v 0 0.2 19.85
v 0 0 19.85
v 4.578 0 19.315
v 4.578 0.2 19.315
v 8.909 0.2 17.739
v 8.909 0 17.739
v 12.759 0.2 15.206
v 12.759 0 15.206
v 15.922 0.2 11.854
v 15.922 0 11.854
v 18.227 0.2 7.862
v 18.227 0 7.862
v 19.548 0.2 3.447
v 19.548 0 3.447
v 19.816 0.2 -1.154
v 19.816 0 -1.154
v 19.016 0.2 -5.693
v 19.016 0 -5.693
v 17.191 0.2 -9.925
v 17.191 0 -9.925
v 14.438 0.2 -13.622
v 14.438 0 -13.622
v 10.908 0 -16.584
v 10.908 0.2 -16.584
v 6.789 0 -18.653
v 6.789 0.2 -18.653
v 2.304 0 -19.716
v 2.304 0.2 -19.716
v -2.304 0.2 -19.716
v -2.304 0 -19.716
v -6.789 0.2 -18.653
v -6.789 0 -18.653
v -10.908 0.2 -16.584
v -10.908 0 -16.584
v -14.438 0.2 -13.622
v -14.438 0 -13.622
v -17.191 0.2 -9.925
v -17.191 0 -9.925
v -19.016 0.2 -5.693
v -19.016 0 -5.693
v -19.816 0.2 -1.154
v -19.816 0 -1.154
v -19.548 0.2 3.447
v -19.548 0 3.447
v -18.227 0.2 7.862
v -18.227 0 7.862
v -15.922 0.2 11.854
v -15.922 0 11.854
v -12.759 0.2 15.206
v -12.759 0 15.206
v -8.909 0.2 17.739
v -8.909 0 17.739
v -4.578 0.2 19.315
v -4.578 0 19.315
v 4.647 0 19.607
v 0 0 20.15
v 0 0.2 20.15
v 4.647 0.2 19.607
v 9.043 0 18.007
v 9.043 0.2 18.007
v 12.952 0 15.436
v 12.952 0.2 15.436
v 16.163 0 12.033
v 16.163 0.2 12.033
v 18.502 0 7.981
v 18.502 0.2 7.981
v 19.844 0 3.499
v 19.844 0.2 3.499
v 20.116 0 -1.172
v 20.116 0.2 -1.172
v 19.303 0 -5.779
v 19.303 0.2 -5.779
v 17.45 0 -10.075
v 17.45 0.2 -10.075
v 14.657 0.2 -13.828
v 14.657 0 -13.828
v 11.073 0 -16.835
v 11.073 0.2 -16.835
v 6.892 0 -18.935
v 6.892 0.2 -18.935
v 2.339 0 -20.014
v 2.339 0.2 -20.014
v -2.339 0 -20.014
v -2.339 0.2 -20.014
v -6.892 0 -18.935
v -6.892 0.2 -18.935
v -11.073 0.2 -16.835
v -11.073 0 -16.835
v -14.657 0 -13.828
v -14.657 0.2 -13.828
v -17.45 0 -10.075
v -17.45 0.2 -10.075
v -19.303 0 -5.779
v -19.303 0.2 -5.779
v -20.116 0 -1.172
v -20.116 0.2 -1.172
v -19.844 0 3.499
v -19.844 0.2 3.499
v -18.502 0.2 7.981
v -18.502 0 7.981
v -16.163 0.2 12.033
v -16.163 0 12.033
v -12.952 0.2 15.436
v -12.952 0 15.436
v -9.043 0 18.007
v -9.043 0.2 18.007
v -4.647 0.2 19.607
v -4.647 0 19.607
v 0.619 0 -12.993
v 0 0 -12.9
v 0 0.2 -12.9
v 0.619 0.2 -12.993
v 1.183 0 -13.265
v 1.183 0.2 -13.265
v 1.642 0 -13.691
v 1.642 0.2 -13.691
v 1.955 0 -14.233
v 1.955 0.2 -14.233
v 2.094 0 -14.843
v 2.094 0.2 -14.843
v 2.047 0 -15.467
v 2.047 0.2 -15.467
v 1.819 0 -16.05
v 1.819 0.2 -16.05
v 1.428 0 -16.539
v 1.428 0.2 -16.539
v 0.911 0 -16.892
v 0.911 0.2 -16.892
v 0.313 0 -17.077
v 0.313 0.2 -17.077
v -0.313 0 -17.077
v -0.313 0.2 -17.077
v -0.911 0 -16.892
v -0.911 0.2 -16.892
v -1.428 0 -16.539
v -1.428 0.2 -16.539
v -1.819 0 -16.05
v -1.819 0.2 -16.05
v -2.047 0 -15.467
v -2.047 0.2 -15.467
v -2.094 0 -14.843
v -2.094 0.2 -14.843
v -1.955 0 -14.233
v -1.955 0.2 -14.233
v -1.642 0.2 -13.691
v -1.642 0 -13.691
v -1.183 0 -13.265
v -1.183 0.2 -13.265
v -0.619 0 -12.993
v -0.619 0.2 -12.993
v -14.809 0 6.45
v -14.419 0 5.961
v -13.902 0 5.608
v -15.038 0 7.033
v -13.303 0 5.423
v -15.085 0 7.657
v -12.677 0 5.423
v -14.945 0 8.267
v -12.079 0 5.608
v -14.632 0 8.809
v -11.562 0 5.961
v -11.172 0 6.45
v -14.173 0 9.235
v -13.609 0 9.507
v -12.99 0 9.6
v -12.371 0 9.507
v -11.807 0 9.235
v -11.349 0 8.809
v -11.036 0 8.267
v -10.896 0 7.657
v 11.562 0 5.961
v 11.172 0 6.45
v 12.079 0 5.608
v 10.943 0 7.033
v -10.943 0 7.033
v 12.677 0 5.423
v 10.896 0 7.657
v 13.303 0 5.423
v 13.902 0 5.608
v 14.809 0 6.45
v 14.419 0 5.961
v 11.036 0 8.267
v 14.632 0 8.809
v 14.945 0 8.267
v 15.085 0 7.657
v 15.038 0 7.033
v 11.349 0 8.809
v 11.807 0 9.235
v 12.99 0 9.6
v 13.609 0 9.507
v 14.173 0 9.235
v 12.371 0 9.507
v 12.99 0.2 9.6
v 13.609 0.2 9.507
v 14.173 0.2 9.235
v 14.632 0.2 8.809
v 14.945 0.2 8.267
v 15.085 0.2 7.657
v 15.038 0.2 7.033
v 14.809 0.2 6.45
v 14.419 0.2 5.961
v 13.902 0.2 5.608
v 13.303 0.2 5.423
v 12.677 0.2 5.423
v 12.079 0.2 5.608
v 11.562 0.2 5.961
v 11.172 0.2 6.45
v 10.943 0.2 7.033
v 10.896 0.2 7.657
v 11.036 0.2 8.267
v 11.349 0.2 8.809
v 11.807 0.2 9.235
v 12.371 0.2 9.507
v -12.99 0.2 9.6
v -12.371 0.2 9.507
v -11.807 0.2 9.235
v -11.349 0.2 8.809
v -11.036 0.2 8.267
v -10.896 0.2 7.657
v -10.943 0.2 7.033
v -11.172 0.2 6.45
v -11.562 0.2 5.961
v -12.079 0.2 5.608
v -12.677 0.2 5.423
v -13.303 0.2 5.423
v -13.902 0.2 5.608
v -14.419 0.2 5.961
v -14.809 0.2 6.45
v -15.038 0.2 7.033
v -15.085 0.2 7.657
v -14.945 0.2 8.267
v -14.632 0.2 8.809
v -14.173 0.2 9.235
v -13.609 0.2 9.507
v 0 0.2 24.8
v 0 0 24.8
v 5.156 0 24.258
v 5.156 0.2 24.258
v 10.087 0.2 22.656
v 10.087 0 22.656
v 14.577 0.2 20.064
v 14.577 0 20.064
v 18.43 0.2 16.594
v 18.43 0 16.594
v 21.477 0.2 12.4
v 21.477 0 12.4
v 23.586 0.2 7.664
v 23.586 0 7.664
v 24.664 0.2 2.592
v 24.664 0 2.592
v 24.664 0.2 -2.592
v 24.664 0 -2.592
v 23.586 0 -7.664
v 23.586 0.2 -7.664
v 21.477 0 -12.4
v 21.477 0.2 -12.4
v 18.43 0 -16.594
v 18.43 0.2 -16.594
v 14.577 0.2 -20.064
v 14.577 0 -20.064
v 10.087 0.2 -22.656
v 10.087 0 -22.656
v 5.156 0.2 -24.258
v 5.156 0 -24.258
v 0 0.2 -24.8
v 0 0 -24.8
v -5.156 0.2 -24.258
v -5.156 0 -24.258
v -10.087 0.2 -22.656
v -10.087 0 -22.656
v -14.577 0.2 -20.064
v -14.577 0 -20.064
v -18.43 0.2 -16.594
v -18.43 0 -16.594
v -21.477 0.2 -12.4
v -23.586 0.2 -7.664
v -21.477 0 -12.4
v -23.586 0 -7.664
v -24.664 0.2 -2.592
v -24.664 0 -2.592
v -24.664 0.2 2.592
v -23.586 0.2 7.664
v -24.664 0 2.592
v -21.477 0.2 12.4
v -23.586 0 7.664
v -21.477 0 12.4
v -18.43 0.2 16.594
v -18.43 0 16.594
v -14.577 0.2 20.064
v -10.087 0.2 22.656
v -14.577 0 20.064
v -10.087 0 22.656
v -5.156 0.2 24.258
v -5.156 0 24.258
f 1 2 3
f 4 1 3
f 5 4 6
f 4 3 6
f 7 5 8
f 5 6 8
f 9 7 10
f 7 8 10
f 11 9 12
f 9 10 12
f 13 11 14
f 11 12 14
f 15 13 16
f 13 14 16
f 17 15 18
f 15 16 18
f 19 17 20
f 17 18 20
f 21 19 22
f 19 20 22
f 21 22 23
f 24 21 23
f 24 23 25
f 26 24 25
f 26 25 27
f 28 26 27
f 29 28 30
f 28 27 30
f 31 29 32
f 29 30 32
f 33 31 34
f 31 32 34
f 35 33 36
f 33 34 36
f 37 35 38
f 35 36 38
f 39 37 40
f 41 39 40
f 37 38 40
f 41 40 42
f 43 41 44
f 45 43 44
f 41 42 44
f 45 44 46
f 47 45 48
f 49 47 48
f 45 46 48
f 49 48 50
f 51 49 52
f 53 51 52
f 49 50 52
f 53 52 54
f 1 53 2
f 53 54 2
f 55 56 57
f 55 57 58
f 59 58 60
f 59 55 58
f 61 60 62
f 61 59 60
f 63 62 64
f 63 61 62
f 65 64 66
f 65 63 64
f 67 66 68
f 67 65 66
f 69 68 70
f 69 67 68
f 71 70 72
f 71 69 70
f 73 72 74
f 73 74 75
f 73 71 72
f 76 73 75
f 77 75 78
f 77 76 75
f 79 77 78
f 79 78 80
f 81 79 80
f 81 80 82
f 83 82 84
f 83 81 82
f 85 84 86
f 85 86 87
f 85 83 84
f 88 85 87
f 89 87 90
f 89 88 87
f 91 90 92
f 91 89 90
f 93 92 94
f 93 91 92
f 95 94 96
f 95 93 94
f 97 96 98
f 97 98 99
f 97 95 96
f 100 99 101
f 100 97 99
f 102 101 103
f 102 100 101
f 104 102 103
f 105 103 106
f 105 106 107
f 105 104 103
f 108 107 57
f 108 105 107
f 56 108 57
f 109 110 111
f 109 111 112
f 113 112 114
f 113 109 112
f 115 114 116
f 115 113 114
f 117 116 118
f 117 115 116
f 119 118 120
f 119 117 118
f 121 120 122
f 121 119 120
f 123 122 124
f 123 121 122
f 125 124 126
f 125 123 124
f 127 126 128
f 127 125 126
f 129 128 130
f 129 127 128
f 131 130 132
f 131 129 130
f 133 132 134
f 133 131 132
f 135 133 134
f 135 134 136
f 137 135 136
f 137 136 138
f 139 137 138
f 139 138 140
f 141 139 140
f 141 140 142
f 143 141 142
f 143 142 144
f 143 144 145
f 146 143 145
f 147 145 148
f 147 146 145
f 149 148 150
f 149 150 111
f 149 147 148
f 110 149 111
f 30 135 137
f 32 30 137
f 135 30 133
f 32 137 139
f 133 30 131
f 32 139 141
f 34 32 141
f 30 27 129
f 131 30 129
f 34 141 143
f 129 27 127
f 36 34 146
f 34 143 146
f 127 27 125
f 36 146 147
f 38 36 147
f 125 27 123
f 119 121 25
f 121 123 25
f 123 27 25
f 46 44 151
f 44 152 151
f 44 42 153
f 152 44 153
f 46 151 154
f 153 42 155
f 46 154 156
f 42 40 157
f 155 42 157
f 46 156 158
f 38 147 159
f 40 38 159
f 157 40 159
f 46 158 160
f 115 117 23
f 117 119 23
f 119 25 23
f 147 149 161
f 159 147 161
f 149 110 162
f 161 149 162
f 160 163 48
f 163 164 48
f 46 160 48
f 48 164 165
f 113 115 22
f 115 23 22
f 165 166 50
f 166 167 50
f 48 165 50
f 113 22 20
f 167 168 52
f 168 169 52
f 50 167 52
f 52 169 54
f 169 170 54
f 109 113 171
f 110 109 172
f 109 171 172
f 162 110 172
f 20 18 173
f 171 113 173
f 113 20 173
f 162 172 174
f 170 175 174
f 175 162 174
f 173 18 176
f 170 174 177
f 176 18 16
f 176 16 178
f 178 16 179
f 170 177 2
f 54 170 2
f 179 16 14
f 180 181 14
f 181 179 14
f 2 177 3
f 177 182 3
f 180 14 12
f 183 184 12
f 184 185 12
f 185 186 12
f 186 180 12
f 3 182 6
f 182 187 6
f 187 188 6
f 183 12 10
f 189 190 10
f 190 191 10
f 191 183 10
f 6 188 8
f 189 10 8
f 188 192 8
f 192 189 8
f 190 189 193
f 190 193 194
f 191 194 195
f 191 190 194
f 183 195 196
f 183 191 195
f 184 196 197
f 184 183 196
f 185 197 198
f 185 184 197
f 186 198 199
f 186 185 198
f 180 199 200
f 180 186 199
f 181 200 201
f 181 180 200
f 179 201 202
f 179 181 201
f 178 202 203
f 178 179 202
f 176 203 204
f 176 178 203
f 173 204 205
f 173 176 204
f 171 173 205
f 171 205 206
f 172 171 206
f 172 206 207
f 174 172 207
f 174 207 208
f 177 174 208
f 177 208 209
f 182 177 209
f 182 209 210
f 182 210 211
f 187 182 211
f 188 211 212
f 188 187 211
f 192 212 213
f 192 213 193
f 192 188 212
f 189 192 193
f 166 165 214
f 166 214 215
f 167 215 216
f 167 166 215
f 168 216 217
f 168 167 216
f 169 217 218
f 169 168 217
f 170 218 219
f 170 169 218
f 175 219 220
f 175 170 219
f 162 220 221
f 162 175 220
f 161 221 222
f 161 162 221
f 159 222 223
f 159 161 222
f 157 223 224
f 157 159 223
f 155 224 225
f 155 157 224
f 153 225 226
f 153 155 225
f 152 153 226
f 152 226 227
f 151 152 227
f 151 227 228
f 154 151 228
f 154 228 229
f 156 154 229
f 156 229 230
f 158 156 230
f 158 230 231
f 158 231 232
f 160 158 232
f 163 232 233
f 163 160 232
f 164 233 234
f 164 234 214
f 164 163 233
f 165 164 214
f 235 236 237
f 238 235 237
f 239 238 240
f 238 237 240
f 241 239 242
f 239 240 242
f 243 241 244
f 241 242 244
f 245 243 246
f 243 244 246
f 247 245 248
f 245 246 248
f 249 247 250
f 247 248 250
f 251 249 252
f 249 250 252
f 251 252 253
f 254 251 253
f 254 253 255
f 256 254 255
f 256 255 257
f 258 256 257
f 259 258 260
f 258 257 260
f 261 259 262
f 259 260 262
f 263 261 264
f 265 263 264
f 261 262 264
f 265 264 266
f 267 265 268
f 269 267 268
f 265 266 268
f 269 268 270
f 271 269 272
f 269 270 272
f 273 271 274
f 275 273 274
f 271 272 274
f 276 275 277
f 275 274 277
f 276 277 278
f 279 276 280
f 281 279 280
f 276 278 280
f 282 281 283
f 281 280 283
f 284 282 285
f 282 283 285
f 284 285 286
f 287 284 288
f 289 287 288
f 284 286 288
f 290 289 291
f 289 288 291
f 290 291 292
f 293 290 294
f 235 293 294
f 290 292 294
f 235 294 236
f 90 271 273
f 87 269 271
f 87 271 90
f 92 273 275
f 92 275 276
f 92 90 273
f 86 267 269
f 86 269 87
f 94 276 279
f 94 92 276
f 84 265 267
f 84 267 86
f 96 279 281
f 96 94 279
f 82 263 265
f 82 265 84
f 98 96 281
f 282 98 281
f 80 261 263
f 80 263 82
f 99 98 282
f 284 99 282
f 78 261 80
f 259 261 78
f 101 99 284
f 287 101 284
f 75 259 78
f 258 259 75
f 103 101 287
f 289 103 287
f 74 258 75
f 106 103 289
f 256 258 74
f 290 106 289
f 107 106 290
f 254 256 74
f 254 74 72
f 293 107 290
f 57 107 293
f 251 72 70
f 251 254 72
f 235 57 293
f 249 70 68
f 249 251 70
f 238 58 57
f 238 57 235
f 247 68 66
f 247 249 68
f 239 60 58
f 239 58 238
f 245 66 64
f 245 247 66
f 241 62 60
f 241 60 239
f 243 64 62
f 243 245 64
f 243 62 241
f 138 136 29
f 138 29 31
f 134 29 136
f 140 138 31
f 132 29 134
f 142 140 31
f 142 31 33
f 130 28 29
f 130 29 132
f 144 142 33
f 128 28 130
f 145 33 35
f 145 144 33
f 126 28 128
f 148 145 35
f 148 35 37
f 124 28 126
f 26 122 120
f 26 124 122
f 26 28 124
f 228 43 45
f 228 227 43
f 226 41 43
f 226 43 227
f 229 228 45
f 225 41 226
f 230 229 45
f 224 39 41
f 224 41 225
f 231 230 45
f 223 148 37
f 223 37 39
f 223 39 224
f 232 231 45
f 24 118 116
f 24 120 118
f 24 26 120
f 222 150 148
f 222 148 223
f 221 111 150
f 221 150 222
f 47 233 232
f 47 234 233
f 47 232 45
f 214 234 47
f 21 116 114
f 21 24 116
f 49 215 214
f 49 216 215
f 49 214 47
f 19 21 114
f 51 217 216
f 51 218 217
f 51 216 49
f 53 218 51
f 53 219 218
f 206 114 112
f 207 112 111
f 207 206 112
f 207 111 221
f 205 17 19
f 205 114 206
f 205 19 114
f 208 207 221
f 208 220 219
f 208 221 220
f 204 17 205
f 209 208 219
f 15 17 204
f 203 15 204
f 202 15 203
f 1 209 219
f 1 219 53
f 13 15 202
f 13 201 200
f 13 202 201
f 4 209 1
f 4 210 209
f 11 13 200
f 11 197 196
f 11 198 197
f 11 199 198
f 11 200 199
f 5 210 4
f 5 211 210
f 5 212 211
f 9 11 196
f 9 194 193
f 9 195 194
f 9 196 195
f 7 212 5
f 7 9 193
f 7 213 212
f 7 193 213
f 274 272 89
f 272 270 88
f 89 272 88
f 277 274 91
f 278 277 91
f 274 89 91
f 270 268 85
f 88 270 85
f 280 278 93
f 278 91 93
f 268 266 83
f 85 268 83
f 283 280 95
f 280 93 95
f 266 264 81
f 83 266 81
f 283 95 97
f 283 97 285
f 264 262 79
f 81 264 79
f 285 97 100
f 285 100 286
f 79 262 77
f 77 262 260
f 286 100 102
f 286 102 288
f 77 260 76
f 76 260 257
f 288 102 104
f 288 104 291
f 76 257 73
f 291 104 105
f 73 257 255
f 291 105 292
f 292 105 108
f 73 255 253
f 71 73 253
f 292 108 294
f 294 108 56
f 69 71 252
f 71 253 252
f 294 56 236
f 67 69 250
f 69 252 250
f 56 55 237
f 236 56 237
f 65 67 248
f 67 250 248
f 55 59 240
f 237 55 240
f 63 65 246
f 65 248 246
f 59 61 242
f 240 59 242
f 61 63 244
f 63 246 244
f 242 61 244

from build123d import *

# Parameters (mm, degrees)
SKETCH1_R             = 24.8
SKETCH1_R_2           = 20.15
BOSS_EXTRUDE1_DEPTH   = 0.2
SKETCH1_R_3           = 19.85
SKETCH1_R_4           = 2.1
BOSS_EXTRUDE1_2_DEPTH = 0.2


with BuildPart() as part:
    # Sketch1 → Boss-Extrude1 (new body)
    with BuildSketch(Plane(origin=(0, 0, 0), x_dir=(1, 0, 0), z_dir=(0, 1, 0))):
        with Locations(Location((0, 0, 0), (0, 0, 270))):
            Circle(SKETCH1_R)
        with Locations(Location((0, 0, 0), (0, 0, 270))):
            Circle(SKETCH1_R_2, mode=Mode.SUBTRACT)
    extrude(amount=BOSS_EXTRUDE1_DEPTH)


with BuildPart() as body_2:
    # Sketch1 → Boss-Extrude1 2 (new body)
    with BuildSketch(Plane(origin=(0, 0, 0), x_dir=(1, 0, 0), z_dir=(0, 1, 0))):
        with Locations(Location((0, 0, 0), (0, 0, 270))):
            Circle(SKETCH1_R_3)
        with Locations(Location((-12.990381057, -7.5, 0), (0, 0, 270))):
            Circle(SKETCH1_R_4, mode=Mode.SUBTRACT)
        with Locations(Location((12.990381057, -7.5, 0), (0, 0, 270))):
            Circle(SKETCH1_R_4, mode=Mode.SUBTRACT)
        with Locations(Location((0, 15, 0), (0, 0, 270))):
            Circle(SKETCH1_R_4, mode=Mode.SUBTRACT)
    extrude(amount=BOSS_EXTRUDE1_2_DEPTH)


solid = Compound([part.part, body_2.part])
